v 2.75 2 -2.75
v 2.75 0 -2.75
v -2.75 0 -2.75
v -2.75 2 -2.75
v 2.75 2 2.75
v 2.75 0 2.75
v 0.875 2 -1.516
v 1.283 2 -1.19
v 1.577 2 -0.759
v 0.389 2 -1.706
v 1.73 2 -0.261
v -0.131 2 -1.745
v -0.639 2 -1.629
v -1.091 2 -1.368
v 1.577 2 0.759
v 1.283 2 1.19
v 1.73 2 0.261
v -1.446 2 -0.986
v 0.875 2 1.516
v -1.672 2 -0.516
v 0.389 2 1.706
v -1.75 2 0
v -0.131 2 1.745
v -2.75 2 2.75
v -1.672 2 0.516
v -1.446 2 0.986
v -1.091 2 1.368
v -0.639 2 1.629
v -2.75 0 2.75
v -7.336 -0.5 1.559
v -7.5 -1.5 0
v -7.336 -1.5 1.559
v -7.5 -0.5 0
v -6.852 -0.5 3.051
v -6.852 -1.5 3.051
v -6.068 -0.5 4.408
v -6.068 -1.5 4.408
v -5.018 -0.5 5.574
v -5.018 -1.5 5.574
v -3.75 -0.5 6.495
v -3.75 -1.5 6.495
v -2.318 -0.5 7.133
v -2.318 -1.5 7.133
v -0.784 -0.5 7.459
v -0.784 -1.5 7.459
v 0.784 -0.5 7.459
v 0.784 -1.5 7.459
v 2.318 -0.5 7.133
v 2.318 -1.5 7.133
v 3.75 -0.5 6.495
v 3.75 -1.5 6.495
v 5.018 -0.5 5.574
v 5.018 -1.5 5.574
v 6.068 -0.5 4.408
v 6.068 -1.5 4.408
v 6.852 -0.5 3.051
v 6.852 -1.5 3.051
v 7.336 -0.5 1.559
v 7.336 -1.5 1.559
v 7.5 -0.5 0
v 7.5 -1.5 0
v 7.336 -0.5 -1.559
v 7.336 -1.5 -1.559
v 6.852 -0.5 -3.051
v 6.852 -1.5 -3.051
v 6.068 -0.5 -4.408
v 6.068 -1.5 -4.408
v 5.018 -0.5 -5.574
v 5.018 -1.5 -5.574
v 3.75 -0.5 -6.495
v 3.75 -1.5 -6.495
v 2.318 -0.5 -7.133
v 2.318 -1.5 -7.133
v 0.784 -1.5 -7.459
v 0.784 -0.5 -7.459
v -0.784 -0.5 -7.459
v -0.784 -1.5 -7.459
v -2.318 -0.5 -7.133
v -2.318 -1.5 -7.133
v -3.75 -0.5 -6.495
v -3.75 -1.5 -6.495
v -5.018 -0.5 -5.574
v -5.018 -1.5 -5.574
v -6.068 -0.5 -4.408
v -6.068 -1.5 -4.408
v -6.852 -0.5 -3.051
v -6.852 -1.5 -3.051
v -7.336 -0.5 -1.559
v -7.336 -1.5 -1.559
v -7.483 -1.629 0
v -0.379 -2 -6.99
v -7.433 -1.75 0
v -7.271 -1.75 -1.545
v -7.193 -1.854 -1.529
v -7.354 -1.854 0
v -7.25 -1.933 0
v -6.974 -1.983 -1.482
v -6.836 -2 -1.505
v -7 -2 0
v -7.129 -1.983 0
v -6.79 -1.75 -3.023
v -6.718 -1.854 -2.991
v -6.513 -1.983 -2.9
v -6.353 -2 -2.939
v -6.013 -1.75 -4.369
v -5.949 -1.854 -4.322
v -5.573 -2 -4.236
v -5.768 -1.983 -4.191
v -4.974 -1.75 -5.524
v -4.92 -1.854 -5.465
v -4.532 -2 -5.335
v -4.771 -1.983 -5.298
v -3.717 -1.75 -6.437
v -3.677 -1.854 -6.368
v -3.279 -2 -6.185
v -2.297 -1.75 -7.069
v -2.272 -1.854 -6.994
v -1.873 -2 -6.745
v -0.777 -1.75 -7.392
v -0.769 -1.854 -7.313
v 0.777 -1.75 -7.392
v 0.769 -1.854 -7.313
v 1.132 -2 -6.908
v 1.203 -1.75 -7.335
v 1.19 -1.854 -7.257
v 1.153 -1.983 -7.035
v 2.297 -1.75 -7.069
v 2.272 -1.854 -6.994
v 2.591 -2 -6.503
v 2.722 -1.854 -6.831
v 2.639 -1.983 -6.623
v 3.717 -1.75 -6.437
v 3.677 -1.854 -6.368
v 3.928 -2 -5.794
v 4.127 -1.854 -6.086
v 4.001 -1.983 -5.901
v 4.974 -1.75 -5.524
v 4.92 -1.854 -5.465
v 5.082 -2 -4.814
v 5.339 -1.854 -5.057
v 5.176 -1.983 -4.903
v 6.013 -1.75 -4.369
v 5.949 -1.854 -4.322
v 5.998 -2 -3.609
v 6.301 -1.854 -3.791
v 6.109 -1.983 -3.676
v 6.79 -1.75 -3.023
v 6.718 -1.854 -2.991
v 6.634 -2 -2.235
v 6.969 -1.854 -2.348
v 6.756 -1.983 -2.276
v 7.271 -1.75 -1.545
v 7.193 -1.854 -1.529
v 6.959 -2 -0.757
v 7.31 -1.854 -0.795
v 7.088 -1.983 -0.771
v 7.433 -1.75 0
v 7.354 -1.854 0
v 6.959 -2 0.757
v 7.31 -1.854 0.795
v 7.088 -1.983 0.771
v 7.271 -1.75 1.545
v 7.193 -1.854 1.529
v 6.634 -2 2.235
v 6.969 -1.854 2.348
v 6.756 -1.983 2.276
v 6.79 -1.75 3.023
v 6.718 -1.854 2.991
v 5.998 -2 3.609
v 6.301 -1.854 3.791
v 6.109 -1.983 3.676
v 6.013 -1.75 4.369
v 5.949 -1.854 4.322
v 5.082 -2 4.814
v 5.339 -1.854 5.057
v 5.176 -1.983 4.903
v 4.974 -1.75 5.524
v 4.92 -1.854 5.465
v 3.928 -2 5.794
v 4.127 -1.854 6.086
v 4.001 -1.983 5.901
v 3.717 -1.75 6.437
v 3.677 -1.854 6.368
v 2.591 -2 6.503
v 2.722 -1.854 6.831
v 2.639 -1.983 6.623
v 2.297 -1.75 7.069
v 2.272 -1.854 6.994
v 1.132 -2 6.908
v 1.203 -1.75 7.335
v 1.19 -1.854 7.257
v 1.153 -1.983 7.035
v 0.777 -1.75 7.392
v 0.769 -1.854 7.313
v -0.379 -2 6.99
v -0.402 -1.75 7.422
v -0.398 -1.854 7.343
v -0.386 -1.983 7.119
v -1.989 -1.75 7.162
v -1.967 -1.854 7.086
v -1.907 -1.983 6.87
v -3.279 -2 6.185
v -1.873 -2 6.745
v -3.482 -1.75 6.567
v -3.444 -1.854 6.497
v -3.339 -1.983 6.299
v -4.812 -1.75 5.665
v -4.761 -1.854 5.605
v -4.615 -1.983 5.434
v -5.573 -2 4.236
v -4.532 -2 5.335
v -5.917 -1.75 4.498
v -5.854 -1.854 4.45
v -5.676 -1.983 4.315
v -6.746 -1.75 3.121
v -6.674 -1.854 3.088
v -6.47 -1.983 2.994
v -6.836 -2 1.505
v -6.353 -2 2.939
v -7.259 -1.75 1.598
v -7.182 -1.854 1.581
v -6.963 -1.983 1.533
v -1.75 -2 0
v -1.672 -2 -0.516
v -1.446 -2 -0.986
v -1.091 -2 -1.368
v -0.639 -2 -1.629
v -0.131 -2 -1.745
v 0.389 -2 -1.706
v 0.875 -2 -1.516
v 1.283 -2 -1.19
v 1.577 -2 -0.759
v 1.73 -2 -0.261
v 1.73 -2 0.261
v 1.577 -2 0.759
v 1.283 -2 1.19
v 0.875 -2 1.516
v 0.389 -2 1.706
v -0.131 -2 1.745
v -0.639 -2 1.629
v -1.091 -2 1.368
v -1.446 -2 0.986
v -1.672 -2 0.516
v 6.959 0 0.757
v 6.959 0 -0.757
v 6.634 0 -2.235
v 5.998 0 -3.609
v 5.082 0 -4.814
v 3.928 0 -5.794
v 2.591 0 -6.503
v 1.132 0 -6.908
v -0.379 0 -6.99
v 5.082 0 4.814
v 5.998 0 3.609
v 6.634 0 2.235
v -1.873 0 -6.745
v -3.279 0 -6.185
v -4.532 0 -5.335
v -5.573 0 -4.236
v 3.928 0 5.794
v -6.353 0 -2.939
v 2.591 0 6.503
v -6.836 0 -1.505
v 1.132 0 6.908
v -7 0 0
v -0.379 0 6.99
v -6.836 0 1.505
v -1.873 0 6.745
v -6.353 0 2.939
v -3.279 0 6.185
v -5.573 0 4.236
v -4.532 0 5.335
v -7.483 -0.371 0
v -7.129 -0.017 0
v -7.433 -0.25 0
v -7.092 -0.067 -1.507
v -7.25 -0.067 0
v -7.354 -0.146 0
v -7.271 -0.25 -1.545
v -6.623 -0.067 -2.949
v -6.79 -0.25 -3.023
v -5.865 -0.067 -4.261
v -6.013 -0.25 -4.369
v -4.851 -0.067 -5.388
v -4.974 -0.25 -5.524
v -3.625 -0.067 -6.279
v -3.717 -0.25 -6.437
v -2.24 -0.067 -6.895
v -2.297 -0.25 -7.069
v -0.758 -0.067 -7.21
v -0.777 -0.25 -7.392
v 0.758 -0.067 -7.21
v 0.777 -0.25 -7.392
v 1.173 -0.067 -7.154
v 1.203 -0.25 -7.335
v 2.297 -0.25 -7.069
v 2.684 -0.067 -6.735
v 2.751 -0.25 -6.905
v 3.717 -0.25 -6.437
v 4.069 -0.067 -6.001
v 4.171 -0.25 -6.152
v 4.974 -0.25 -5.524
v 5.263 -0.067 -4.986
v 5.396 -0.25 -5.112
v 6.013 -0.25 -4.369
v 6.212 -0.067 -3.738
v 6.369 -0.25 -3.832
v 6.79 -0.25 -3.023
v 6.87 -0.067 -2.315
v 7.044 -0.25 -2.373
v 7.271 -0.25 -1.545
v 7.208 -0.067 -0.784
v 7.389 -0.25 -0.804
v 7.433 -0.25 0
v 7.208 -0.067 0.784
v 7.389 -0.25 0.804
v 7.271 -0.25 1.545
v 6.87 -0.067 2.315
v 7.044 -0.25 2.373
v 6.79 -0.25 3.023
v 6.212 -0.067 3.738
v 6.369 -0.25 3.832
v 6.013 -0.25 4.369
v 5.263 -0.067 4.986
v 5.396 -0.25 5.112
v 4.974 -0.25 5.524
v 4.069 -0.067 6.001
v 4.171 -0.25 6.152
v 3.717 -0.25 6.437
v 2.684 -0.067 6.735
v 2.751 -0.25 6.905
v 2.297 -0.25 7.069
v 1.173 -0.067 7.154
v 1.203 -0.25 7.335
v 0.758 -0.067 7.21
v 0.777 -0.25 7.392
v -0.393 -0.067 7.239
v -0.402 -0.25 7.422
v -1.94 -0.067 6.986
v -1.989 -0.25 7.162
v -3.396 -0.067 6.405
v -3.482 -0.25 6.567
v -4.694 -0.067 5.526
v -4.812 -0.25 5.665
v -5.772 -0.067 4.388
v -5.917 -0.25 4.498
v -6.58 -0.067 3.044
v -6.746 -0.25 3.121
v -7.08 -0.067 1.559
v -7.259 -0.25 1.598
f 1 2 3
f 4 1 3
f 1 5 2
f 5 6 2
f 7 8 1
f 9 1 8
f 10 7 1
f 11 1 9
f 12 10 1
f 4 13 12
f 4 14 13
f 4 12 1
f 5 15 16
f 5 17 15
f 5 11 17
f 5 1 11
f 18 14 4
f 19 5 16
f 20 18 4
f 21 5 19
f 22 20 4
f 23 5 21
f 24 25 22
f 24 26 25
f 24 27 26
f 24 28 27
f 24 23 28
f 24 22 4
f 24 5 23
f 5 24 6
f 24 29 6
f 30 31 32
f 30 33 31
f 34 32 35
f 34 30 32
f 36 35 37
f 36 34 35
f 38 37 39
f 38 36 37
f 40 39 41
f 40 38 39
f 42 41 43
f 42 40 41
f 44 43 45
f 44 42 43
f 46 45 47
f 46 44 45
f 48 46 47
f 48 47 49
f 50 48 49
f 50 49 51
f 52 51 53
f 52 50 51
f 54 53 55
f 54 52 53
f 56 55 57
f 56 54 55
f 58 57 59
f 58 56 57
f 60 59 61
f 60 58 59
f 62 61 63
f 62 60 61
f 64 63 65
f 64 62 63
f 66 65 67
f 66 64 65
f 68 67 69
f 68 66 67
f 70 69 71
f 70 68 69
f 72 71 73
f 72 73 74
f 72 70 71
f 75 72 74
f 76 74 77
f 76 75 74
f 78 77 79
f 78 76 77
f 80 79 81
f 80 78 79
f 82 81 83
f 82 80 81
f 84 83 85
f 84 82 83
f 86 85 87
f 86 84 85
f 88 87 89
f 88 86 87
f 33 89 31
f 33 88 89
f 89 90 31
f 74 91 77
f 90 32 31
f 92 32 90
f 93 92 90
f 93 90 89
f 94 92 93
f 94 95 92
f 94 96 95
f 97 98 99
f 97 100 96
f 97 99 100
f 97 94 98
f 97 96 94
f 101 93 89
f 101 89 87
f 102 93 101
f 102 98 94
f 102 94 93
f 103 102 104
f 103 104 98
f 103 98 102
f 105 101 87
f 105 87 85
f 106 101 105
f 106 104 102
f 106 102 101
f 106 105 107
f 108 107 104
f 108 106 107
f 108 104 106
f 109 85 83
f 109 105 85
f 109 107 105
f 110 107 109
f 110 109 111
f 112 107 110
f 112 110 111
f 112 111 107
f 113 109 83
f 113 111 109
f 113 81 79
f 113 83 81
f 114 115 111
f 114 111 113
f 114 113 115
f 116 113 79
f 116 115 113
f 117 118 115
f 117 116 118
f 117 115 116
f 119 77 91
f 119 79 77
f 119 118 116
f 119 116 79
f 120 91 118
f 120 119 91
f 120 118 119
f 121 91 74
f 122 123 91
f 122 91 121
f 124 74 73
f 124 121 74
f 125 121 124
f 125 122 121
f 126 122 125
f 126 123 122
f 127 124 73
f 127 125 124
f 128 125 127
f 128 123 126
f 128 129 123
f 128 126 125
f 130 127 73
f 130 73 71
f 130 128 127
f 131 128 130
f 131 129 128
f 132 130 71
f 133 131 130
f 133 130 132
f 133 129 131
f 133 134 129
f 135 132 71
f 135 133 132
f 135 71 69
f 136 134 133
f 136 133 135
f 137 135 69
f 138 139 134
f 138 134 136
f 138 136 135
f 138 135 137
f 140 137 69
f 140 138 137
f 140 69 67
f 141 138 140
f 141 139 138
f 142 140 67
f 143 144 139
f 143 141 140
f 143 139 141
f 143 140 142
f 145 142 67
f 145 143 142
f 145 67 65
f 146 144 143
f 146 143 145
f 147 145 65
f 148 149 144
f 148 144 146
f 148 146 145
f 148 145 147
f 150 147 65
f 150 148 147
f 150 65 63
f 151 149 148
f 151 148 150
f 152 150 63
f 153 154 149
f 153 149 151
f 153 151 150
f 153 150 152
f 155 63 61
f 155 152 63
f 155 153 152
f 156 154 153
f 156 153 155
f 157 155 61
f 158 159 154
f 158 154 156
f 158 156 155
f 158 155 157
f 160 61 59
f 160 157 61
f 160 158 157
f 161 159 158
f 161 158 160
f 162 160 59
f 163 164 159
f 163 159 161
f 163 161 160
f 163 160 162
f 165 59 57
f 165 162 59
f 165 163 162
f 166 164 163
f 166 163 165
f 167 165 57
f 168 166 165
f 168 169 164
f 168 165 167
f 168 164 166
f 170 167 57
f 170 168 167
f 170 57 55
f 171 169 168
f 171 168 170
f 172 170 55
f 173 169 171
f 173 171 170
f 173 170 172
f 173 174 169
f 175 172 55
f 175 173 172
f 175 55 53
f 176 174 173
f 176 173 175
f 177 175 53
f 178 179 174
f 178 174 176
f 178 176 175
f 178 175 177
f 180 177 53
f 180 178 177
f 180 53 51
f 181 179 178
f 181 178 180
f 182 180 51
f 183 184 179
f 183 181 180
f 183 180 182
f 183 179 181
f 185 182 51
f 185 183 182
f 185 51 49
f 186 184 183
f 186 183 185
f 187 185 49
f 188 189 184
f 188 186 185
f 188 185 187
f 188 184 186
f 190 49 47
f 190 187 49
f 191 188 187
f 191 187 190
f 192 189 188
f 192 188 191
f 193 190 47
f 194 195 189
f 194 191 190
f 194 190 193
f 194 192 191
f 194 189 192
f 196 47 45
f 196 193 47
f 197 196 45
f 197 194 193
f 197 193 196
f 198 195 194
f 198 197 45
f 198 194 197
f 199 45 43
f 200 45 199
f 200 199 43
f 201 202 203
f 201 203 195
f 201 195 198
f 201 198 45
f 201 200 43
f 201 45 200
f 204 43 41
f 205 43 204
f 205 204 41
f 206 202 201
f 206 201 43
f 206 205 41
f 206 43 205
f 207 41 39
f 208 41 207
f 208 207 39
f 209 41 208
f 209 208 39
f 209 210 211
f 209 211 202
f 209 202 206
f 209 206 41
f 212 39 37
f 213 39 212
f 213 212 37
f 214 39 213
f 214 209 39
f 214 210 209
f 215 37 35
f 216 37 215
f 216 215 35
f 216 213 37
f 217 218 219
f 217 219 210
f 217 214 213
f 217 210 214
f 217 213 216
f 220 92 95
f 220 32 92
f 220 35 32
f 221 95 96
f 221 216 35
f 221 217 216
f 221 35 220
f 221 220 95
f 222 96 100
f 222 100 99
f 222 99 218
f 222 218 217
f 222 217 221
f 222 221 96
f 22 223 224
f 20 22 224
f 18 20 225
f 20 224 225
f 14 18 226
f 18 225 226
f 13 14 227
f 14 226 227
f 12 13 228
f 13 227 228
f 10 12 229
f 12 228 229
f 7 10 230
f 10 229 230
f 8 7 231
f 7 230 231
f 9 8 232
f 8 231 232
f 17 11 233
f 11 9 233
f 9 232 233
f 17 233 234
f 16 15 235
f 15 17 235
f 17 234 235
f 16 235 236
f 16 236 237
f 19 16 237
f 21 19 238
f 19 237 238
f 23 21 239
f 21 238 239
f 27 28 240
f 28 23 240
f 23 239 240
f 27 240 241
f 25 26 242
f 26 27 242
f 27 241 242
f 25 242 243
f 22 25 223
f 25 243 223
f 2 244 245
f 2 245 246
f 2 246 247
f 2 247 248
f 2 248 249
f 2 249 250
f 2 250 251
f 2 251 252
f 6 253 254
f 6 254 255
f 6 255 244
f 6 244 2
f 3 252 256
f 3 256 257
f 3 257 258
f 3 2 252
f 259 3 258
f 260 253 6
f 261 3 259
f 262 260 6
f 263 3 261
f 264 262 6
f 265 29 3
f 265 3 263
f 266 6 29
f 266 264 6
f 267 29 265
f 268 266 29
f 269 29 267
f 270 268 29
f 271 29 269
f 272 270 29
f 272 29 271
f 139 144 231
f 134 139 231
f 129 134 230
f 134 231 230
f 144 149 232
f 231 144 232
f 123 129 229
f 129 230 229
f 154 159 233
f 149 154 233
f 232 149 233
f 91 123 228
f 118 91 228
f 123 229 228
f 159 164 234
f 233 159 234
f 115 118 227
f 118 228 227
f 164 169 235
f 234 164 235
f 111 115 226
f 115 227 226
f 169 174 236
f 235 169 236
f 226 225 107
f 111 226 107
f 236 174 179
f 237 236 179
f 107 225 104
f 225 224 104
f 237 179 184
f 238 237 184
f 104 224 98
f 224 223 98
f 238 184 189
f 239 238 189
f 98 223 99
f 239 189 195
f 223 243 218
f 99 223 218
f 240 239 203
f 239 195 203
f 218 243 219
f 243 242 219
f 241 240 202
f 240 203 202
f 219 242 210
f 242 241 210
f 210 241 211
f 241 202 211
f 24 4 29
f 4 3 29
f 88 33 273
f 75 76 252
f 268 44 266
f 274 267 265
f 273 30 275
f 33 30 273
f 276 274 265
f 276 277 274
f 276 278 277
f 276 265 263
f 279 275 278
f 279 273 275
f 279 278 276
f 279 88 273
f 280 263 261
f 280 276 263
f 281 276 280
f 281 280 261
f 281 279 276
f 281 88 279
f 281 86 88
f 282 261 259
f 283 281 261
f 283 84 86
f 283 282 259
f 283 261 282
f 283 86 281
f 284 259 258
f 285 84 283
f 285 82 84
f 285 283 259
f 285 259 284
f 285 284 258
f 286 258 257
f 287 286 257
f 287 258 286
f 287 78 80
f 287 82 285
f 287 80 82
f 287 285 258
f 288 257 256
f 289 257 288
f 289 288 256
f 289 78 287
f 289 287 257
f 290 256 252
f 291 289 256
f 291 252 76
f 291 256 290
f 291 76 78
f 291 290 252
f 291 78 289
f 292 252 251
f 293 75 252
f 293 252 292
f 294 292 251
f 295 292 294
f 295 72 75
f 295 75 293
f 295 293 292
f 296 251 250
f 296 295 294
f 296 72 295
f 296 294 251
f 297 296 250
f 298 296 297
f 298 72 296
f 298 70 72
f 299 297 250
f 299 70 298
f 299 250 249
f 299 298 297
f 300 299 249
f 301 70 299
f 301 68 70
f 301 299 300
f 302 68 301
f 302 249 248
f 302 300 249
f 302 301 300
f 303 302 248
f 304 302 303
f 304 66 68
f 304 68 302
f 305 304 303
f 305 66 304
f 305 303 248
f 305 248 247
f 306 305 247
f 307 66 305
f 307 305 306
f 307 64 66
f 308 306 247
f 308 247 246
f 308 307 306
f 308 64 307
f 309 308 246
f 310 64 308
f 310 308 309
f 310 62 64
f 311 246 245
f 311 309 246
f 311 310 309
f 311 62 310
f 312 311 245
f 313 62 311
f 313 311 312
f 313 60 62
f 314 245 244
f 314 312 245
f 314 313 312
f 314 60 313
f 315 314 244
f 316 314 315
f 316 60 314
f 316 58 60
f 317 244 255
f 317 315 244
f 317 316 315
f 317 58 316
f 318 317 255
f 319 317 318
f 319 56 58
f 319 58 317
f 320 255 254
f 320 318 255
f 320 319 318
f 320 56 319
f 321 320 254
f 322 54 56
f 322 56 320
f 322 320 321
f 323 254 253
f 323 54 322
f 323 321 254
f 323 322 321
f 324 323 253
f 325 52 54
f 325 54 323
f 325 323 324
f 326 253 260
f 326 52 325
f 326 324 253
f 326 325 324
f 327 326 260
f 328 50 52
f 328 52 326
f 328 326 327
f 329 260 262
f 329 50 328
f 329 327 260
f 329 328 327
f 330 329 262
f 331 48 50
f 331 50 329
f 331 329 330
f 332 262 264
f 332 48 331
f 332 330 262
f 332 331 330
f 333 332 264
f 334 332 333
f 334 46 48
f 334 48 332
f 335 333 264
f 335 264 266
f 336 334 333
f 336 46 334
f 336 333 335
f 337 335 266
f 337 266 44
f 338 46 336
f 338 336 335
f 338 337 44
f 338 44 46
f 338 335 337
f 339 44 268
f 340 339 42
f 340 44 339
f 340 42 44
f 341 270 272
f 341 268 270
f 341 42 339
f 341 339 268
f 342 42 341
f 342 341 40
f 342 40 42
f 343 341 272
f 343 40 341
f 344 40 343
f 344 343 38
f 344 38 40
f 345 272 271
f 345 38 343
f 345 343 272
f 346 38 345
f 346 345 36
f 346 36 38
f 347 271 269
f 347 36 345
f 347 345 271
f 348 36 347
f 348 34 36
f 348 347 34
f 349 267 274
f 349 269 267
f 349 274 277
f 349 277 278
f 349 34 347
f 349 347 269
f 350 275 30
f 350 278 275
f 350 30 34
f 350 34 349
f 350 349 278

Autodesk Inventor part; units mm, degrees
ref_plane "YZ Plane" through (0, 0, 0) normal (1, 0, 0) x (0, 1, 0)
ref_plane "XZ Plane" through (0, 0, 0) normal (0, 1, 0) x (-1, 0, 0)
ref_plane "XY Plane" through (0, 0, 0) normal (0, 0, 1) x (1, 0, 0)
sketch "Sketch1" plane through (0, 0, 0) normal (0, 1, 0) x (-1, 0, 0)
  circle A0 centre (0, 0) radius 1.75
  circle A1 centre (0, 0) radius 7.5
  line L0 (-2.75, -2.75) -> (2.75, -2.75)
  line L1 (2.75, -2.75) -> (2.75, 2.75)
  line L2 (2.75, 2.75) -> (-2.75, 2.75)
  line L3 (-2.75, 2.75) -> (-2.75, -2.75)
  line L4 (-2.75, -2.75) -> (2.75, 2.75) construction
  line L5 (2.75, -2.75) -> (-2.75, 2.75) construction
  dimension "d1" = 3.5
  dimension "d2" = 15
  dimension "d3" = 5.5
  dimension "d4" = 5.5
extrude "Extrusion1" add sketch "Sketch1" along normal blind 2 contours L3 L2 L1 L0
extrude "Extrusion2" add sketch "Sketch1" against normal blind 2 contours A1 | L3 L2 L1 L0
fillet "Fillet1" radius 0.5 2 edges at (7.5, 0, 0) (7.5, -2, 0)
equation "\"d2\" = CapDiameter"
equation "\"d5\" = PIVOT_DEPTH"
equation "\"d7\" = CapHeight"
equation "\"CapDiameter\" = 15"
equation "\"CapHeight\" = 2"
equation "\"PIVOT_DEPTH\" = 2"
properties part number "FrictionCap"
